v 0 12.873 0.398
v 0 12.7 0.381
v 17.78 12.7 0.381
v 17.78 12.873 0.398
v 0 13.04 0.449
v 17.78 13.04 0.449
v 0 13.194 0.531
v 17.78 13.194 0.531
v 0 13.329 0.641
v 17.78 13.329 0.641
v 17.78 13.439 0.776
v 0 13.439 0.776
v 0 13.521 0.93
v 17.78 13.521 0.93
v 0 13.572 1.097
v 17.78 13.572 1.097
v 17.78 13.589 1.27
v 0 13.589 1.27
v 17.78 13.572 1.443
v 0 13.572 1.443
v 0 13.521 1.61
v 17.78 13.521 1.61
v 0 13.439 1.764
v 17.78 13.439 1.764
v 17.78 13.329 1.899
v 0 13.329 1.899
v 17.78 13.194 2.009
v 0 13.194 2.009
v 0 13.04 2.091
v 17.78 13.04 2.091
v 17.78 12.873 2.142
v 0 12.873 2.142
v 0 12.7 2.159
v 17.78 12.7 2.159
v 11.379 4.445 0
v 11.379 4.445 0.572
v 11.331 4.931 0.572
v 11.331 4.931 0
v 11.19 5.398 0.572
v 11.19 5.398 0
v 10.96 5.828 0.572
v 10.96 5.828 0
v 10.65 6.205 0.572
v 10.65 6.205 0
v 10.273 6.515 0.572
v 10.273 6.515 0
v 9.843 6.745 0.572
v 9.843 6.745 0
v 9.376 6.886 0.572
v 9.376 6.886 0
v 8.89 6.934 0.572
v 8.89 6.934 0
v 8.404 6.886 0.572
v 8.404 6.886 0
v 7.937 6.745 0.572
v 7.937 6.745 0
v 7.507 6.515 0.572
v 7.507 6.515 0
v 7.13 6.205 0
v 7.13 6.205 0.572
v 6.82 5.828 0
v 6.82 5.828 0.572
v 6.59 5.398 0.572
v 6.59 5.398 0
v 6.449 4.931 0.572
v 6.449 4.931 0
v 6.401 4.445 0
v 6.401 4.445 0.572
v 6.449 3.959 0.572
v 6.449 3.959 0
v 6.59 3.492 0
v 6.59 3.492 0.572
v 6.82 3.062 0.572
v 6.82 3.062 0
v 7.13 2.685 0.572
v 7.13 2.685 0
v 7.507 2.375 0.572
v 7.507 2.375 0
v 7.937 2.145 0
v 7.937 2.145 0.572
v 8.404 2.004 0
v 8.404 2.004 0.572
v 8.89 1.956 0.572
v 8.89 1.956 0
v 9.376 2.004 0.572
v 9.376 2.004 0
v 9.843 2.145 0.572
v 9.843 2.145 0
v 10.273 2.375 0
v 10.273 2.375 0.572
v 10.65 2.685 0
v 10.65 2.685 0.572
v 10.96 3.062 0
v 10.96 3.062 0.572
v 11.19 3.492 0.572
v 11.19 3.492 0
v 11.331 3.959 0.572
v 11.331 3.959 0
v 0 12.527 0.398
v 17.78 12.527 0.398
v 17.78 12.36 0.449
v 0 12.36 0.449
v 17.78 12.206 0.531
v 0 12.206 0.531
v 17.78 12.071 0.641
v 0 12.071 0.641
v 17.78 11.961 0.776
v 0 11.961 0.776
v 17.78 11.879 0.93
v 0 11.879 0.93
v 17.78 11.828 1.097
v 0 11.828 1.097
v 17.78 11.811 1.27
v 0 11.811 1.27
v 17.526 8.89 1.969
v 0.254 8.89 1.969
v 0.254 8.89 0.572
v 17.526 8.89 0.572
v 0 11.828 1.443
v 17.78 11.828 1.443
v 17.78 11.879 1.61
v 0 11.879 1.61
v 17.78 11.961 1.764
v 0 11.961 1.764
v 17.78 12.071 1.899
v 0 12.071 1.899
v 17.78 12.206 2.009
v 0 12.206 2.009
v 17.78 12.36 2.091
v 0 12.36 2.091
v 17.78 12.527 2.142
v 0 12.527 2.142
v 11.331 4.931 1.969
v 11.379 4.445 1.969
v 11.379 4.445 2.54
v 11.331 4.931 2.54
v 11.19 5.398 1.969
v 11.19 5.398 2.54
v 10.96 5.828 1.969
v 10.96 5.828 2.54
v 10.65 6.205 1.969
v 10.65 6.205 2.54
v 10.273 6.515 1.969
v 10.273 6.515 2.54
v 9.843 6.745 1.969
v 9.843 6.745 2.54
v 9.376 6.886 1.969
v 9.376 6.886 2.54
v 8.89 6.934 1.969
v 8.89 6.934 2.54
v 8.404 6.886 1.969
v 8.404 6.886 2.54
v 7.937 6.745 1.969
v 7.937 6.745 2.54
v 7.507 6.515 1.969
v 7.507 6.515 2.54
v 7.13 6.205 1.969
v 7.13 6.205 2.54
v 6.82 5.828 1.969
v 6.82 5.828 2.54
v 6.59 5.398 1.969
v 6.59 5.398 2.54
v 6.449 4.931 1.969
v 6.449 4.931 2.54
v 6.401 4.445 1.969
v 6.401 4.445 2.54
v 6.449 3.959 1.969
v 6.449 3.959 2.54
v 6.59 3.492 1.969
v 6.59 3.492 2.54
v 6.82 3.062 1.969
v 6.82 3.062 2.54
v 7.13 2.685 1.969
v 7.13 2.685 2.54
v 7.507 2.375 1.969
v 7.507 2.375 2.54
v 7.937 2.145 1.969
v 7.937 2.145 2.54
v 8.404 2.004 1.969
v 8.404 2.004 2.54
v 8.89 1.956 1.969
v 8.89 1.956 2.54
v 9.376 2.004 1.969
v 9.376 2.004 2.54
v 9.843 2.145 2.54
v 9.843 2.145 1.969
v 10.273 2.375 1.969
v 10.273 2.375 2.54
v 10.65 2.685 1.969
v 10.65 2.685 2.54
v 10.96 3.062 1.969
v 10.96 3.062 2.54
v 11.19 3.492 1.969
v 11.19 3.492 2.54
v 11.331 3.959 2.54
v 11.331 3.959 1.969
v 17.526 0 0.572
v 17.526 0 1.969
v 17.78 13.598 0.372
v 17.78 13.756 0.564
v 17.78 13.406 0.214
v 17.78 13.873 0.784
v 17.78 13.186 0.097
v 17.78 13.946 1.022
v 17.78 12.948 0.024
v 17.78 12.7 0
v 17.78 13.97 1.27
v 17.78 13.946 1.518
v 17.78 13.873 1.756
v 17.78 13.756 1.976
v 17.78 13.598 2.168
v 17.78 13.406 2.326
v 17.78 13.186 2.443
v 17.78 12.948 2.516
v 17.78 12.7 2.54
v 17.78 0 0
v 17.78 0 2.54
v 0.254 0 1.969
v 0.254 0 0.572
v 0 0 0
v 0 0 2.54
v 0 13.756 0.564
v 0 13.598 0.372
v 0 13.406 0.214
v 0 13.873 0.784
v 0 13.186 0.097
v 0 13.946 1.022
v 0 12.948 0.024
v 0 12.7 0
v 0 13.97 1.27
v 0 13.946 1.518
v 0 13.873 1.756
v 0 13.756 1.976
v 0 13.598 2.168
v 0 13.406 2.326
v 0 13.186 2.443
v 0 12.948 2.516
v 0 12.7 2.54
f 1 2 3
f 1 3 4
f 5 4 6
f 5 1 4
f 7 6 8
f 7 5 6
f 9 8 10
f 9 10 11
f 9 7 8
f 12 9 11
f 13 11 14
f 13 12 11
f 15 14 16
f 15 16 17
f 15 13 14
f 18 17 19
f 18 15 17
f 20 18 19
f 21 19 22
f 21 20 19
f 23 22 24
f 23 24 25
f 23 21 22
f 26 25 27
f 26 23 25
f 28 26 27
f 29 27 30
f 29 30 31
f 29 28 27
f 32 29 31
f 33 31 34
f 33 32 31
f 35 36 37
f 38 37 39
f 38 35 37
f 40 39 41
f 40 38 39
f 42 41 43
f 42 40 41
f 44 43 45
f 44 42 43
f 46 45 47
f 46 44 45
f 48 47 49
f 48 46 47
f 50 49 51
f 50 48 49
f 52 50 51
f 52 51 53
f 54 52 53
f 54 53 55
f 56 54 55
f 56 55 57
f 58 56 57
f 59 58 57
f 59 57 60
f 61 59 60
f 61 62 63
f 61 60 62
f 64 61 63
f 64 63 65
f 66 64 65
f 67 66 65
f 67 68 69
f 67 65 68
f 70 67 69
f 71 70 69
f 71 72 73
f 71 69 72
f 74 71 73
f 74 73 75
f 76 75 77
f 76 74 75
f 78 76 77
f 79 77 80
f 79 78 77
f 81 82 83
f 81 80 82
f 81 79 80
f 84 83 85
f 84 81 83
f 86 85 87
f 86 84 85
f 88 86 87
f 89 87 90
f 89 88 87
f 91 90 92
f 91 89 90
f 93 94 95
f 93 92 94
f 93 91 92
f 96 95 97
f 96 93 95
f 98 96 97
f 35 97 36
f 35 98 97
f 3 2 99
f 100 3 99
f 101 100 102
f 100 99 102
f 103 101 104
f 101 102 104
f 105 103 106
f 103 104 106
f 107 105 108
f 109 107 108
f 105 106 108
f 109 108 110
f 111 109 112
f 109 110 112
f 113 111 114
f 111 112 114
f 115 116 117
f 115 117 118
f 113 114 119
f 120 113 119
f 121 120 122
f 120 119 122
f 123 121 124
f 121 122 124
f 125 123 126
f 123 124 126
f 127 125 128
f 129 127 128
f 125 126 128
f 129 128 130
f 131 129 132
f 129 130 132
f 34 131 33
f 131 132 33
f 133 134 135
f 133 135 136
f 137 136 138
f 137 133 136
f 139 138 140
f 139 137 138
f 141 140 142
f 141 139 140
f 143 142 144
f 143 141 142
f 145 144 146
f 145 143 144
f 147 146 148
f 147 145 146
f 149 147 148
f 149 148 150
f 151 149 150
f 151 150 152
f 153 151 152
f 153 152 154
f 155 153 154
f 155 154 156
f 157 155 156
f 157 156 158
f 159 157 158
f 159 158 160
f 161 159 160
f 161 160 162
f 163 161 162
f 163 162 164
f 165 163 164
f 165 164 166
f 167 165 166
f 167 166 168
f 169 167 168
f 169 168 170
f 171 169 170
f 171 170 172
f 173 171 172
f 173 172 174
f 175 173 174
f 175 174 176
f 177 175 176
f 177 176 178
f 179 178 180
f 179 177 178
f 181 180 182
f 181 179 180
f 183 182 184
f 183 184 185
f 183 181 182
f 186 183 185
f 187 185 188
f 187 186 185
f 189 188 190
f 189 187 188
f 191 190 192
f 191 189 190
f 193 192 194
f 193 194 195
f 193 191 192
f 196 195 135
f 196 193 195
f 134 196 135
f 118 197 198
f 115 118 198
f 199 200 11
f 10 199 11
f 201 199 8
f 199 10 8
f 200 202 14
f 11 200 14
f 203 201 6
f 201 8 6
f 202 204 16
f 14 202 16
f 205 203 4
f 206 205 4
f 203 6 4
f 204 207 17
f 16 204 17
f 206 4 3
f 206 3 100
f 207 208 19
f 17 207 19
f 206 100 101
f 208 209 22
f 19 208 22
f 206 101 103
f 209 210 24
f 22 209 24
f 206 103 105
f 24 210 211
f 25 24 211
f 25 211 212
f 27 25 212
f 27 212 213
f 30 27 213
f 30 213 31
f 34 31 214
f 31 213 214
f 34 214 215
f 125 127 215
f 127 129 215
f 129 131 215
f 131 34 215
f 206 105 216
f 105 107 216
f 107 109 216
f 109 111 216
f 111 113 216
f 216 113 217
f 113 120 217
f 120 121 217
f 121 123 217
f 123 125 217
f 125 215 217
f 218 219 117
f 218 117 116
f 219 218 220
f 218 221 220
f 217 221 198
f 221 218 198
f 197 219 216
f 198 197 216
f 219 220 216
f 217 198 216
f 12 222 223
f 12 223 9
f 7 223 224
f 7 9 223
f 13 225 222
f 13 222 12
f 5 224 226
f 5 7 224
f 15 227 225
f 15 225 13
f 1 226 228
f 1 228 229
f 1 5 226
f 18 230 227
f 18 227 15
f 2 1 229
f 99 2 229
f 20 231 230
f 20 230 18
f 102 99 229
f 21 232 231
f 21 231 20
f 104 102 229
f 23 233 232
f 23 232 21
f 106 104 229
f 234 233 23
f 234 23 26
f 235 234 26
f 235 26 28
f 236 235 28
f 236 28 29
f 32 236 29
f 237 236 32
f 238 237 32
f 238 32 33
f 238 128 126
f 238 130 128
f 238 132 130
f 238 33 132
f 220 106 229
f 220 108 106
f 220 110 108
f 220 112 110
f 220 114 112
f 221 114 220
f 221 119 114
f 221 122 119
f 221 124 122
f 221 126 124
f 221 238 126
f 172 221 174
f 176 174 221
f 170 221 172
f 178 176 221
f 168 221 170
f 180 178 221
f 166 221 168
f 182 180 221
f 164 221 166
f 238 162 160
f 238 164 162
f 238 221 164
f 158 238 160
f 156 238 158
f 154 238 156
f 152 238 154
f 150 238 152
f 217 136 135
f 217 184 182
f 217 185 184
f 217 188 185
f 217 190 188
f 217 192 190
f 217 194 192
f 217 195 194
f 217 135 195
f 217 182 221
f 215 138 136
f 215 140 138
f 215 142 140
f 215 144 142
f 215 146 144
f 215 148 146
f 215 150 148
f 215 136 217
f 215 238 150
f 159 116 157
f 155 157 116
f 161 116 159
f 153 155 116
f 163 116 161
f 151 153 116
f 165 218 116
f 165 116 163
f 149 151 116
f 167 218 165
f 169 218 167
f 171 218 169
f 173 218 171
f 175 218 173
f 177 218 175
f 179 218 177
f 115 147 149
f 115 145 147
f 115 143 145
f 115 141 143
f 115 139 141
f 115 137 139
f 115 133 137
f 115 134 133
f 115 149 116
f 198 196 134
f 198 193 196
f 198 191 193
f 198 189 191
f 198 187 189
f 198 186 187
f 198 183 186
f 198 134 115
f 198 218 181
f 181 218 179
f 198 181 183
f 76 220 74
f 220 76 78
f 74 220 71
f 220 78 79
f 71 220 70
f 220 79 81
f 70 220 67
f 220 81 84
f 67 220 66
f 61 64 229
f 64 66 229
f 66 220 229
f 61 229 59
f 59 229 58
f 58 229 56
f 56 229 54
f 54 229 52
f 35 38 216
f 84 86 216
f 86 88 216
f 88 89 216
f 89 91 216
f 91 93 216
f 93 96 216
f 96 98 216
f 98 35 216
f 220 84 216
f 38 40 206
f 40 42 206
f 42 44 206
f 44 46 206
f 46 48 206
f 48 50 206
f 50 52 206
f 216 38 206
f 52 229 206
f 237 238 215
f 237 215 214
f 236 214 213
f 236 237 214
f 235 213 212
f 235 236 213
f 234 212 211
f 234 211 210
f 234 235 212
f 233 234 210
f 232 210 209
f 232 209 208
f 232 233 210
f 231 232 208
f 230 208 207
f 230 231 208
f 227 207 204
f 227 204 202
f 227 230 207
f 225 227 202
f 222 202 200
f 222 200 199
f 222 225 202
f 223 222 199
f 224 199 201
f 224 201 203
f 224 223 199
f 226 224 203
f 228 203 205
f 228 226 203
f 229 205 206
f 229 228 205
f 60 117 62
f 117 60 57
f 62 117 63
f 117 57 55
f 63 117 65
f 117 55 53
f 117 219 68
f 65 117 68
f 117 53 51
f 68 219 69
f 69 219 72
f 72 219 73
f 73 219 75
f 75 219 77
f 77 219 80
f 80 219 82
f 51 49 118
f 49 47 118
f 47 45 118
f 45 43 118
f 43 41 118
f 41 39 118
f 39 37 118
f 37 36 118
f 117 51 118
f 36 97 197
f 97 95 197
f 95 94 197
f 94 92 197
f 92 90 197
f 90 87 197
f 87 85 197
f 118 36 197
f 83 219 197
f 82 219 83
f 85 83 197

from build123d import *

# Parameters (mm, degrees)
F0_W     = 17.78
F0_H     = 12.7
F0_R     = 2.4892
F1_DEPTH = 2.54
F2_W     = 17.272
F2_H     = 1.397
F3_DEPTH = 8.89
F5_DEPTH = 17.78
F6_DEPTH = 25.4


with BuildPart() as f1:
    # F0 (on Top) → F1 (new body)
    with BuildSketch(Plane.XY):
        with Locations((8.89, 6.35)):
            Rectangle(F0_W, F0_H)
        with Locations((8.89, 4.445)):
            Circle(F0_R, mode=Mode.SUBTRACT)
    extrude(amount=F1_DEPTH)

    # F2 (on face) → F3 (cut)
    with BuildSketch(Plane.XZ):
        with Locations((8.89, 1.27)):
            Rectangle(F2_W, F2_H)
    extrude(amount=-F3_DEPTH, mode=Mode.SUBTRACT)

    # F4 (on face) → F5 (join)
    with BuildSketch(Plane(origin=(0, 0, 0), x_dir=(0, -1, 0), z_dir=(-1, 0, 0))):
        with BuildLine():
            Line((-12.7, 2.159), (-12.7, 2.54))
            ThreePointArc((-12.7, 2.54), (-13.97, 1.27), (-12.7, 0))
            Line((-12.7, 0), (-12.7, 0.381))
            ThreePointArc((-12.7, 0.381), (-13.589, 1.27), (-12.7, 2.159))
        make_face()
    extrude(amount=-F5_DEPTH)

    # F4 (on face) → F6 (cut)
    with BuildSketch(Plane(origin=(0, 0, 0), x_dir=(0, -1, 0), z_dir=(-1, 0, 0))):
        with BuildLine():
            ThreePointArc((-11.811, 1.27), (-12.071382, 1.898618), (-12.7, 2.159))
            Line((-12.7, 2.159), (-12.7, 0.381))
            ThreePointArc((-12.7, 0.381), (-12.071382, 0.641382), (-11.811, 1.27))
        make_face()
    extrude(amount=-F6_DEPTH, mode=Mode.SUBTRACT)


solid = f1.part
